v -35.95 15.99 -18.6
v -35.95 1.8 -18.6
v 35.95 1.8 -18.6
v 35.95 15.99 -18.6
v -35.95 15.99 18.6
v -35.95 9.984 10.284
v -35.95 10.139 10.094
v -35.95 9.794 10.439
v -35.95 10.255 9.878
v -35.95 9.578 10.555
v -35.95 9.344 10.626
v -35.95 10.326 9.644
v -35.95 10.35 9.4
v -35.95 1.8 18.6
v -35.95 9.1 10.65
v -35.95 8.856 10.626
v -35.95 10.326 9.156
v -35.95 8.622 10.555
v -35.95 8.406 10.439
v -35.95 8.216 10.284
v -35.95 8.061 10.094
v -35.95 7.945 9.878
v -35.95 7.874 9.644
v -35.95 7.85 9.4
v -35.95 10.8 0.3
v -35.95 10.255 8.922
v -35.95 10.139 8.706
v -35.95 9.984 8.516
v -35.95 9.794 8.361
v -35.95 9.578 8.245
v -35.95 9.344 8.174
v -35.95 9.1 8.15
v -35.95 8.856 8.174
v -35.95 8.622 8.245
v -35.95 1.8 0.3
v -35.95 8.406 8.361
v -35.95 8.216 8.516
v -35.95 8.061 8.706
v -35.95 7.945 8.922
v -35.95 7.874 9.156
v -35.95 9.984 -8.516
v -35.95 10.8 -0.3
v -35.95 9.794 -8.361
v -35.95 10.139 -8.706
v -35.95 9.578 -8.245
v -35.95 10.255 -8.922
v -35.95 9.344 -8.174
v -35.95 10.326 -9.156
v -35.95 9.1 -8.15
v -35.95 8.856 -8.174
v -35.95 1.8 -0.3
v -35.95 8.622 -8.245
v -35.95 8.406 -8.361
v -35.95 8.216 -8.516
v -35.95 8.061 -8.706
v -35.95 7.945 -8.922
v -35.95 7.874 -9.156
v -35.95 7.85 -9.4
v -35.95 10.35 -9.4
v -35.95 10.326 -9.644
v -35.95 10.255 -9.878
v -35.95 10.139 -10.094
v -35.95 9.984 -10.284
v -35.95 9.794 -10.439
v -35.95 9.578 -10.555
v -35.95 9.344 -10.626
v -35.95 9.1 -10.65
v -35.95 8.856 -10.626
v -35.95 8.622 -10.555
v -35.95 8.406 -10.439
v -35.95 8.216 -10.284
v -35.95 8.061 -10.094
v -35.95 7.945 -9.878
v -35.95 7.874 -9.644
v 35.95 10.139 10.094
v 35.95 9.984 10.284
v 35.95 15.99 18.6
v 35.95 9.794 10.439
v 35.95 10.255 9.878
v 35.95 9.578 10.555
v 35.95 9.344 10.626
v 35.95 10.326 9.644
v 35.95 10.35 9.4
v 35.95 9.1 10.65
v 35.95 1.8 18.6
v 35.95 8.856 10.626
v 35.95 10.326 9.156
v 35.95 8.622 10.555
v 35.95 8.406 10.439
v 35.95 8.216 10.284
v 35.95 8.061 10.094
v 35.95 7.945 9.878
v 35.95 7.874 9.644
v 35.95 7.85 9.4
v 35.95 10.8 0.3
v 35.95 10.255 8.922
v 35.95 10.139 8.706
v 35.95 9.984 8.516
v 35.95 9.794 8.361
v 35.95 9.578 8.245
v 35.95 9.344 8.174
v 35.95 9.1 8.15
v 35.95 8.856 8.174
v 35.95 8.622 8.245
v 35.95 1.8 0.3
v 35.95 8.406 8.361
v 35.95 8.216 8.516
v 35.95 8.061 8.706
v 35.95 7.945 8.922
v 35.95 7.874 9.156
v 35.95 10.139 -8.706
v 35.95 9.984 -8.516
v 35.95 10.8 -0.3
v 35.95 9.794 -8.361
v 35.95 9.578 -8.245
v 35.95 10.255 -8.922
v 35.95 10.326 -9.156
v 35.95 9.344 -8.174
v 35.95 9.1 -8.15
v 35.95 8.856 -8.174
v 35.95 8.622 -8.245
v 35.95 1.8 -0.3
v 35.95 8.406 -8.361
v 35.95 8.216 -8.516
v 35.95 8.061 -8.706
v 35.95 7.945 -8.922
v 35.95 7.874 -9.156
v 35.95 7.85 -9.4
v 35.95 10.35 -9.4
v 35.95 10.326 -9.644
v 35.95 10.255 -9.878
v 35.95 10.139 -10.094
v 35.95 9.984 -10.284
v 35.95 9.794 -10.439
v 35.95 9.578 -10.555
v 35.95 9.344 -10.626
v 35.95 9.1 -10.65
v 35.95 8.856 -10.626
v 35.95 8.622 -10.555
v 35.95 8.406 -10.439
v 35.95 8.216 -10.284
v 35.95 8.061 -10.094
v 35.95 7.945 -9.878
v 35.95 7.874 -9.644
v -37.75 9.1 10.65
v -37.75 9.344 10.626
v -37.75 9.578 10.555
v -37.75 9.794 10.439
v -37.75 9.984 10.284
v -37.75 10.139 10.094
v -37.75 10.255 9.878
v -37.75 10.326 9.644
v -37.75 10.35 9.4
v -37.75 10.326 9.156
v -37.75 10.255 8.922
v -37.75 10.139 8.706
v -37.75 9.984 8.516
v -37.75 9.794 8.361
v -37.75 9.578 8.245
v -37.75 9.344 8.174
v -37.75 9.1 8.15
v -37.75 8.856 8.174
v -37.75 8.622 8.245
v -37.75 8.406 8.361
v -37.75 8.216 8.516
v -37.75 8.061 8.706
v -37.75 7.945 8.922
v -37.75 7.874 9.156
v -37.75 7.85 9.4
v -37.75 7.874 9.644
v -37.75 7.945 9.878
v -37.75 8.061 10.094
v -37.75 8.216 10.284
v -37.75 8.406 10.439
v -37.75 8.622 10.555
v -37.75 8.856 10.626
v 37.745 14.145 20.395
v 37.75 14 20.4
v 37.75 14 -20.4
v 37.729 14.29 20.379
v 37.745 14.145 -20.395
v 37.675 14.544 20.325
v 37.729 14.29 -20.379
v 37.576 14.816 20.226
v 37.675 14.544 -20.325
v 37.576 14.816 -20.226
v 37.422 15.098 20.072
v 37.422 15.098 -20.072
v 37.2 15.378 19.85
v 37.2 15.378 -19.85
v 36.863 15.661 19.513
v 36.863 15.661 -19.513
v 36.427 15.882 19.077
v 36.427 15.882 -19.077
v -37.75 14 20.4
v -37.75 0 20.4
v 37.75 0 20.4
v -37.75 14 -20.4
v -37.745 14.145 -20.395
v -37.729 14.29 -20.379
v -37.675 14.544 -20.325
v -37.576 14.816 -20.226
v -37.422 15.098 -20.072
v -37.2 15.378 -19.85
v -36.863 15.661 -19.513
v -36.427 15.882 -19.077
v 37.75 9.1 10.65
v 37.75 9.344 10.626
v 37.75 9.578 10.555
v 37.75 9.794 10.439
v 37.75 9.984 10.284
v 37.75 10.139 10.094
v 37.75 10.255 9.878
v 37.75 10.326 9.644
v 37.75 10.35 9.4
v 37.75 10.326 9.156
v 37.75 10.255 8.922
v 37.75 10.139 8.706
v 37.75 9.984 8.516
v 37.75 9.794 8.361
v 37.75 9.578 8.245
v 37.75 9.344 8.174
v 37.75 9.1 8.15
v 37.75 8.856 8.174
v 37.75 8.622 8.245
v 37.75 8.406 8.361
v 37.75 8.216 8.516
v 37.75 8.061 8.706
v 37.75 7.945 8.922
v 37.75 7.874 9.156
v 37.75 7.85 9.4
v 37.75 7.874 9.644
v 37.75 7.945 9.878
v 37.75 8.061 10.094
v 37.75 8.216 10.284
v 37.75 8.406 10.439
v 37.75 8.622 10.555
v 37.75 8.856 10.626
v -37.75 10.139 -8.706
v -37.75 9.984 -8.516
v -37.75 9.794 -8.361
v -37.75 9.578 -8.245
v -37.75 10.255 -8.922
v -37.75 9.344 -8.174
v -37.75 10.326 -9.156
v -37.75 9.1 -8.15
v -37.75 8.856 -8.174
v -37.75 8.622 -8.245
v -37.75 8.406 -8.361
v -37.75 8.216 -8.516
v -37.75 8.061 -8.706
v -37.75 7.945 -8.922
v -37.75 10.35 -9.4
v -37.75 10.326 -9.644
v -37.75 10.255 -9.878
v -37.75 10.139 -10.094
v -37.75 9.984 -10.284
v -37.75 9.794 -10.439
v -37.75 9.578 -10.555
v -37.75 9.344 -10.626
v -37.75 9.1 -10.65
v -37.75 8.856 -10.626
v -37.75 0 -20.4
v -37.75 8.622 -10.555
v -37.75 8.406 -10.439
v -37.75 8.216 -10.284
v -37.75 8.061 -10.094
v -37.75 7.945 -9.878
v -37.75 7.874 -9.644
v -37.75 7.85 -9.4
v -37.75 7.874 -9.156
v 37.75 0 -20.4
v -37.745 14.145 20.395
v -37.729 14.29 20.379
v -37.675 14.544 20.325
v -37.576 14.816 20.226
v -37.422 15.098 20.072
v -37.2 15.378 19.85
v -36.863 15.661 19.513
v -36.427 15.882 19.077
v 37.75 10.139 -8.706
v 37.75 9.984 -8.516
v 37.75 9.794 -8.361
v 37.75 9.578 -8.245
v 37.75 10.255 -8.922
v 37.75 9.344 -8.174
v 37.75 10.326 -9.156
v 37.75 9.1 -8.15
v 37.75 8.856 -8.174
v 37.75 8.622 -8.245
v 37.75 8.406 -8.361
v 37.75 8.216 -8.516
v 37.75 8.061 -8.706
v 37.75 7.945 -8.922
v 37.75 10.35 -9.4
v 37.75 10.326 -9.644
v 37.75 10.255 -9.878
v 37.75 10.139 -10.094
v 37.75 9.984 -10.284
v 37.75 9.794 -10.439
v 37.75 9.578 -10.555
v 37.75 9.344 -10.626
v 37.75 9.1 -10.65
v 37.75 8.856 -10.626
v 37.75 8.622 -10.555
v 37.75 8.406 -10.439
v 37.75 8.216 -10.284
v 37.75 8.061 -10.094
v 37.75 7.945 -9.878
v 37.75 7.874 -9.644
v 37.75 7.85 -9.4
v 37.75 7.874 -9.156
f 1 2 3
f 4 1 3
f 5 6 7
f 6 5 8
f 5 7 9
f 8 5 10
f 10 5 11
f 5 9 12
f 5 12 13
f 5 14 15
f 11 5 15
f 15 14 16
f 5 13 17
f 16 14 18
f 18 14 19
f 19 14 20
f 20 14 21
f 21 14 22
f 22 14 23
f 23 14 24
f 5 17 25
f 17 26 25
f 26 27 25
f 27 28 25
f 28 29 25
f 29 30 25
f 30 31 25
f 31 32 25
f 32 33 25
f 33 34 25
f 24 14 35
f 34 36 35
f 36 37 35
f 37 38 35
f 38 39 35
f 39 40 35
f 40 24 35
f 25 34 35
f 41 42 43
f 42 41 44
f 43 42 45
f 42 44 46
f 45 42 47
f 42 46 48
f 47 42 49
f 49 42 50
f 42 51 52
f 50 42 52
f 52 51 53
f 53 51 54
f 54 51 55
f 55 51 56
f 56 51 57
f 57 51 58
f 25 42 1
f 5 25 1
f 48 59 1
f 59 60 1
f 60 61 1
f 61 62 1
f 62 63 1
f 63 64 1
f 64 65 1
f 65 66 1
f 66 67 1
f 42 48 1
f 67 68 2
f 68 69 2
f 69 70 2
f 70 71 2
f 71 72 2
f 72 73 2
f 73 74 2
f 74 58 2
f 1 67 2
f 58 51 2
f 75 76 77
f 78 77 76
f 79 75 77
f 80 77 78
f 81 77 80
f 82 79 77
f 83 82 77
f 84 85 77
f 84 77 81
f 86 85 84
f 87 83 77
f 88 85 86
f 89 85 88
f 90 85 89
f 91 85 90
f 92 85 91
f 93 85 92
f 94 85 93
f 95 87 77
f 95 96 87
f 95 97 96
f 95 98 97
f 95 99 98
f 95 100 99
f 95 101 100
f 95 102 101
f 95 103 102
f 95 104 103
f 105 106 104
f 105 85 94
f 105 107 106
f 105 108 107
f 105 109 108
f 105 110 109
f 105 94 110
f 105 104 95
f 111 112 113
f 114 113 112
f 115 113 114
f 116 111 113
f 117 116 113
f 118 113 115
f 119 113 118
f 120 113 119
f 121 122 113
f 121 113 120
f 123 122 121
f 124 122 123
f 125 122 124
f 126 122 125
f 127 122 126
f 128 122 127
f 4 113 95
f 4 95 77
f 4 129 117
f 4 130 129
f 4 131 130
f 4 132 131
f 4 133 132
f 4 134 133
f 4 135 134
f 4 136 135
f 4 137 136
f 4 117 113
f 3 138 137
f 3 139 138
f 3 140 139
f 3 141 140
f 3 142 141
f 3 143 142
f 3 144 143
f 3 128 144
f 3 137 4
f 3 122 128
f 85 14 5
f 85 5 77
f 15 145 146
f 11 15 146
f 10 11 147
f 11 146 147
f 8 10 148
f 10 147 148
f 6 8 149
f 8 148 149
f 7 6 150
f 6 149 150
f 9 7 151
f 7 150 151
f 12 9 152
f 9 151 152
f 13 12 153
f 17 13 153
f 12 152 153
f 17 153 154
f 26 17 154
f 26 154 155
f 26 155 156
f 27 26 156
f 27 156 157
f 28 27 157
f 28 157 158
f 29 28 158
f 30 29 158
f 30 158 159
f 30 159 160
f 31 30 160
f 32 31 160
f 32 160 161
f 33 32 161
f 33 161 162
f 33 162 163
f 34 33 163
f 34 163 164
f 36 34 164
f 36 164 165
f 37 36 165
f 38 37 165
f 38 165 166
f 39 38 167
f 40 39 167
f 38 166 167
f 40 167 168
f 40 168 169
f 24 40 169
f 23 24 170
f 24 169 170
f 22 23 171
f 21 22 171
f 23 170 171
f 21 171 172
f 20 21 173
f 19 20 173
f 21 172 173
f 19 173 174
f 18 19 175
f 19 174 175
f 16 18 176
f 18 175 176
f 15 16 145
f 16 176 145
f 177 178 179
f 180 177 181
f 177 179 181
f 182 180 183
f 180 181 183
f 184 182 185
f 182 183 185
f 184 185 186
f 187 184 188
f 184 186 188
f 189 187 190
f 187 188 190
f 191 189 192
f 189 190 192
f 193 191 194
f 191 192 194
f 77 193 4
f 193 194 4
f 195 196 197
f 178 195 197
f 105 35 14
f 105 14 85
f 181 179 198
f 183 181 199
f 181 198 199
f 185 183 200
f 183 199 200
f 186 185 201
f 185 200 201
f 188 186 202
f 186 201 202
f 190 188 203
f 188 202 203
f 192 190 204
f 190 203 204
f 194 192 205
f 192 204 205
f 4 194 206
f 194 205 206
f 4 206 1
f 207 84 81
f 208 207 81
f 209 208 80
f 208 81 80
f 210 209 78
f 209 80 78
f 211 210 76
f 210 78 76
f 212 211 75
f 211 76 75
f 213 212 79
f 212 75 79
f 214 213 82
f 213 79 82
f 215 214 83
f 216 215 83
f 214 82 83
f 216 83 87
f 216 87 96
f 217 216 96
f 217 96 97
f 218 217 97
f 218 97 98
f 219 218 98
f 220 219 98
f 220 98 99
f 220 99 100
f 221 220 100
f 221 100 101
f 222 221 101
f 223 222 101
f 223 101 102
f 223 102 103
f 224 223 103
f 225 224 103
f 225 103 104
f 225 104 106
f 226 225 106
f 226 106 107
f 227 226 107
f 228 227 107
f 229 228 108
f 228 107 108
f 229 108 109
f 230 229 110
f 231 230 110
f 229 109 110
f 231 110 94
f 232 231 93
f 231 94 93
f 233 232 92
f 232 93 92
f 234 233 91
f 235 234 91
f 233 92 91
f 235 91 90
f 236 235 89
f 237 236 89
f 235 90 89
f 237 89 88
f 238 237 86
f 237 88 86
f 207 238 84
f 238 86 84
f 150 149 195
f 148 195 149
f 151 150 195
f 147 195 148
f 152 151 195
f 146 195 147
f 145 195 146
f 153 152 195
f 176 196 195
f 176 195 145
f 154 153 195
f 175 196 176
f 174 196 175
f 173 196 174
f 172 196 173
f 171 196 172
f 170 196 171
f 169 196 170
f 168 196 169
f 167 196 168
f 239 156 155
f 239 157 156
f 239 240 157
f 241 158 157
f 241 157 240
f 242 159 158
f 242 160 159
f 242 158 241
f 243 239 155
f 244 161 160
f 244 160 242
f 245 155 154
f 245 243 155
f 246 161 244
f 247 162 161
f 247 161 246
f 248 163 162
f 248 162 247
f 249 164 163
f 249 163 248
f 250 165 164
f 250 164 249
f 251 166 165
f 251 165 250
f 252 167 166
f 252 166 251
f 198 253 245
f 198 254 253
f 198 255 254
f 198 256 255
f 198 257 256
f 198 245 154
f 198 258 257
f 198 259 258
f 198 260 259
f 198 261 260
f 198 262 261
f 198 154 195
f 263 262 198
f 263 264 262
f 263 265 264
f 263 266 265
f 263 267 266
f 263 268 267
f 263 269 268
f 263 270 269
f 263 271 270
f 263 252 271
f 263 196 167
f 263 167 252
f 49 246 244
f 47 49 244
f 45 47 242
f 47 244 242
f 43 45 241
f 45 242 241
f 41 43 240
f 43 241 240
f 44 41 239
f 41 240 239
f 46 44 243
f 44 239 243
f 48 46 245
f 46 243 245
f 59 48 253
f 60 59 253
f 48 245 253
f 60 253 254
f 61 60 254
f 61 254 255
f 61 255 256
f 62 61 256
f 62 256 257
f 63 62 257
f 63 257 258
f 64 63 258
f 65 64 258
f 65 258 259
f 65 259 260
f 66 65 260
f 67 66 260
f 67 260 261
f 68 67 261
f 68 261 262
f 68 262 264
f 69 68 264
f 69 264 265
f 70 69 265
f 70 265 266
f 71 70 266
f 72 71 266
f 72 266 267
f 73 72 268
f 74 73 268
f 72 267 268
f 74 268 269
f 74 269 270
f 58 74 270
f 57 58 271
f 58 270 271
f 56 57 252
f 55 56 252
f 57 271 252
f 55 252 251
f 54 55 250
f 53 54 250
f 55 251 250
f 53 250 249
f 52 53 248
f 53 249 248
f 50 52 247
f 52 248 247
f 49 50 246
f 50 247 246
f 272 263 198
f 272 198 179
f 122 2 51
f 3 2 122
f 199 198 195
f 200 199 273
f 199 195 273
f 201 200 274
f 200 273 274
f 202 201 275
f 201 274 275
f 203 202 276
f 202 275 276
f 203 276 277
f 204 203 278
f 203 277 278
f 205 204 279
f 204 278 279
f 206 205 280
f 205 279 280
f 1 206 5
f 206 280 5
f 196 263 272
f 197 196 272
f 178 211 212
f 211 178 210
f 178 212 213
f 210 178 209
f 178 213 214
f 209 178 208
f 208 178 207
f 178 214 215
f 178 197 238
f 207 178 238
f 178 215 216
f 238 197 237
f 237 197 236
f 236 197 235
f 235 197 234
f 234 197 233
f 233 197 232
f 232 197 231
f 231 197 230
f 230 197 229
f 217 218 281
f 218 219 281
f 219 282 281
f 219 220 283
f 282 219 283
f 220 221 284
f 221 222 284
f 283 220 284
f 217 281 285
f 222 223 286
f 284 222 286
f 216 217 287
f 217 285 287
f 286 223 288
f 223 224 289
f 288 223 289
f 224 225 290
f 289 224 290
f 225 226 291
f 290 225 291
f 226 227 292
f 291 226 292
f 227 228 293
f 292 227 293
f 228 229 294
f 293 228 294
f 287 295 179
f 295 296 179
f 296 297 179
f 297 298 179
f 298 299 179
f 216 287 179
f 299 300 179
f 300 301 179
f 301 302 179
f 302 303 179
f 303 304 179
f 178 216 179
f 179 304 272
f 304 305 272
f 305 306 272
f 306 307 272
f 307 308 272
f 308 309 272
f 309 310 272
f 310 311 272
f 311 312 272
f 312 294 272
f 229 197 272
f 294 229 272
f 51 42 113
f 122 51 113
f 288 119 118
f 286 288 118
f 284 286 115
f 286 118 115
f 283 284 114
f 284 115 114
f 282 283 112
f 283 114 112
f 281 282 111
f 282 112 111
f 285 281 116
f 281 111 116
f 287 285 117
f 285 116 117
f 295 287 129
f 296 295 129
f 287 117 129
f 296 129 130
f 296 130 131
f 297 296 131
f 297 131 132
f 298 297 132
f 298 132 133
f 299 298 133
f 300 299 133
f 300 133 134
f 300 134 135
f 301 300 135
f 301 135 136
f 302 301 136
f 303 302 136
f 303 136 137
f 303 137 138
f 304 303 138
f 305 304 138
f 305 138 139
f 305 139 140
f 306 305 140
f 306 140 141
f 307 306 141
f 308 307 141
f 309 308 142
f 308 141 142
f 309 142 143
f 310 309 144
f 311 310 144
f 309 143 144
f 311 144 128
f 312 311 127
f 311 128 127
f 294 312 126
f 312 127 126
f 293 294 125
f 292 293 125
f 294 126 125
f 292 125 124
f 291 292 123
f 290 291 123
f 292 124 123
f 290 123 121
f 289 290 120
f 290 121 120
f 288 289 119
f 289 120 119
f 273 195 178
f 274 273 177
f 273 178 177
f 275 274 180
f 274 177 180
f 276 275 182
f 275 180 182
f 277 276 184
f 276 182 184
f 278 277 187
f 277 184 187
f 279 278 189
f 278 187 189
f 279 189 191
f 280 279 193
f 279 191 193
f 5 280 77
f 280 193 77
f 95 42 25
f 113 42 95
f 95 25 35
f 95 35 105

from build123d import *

# Parameters (mm, degrees)
CROQUIS1_W                   = 75.5
CROQUIS1_H                   = 40.8
SALIENTE_EXTRUIR1_DEPTH      = 16
VACIADO1_T                   = -1.8
SALIENTE_EXTRUIR2_DEPTH      = 0.3
SALIENTE_EXTRUIR2_DEPTH_BACK = 0.3
CROQUIS2_W                   = 71.9
CROQUIS2_H                   = 9
CORTAR_EXTRUIR1_REACH        = 81.827
CROQUIS3_R                   = 1.25
MATRIZL1_COUNT               = 2
MATRIZL1_PITCH               = 18.8
REDONDEO1_R                  = 2


with BuildPart() as part:
    # Croquis1 → Saliente-Extruir1 (new body)
    with BuildSketch(Plane(origin=(0, 0, 0), x_dir=(1, 0, 0), z_dir=(0, 1, 0))):
        Rectangle(CROQUIS1_W, CROQUIS1_H)
    extrude(amount=SALIENTE_EXTRUIR1_DEPTH)

    # Vaciado1
    vaciado1_openings = [part.faces().sort_by_distance(p)[0] for p in [
        (0, 16, 0),
    ]]
    offset(amount=VACIADO1_T, openings=vaciado1_openings, kind=Kind.INTERSECTION)

    # Croquis2 → Saliente-Extruir2 (add, two sides: drawn at the far end of the back side and taken through both)
    with BuildSketch(Plane.XY.offset(-SALIENTE_EXTRUIR2_DEPTH_BACK)):
        with Locations((0, 6.3)):
            Rectangle(CROQUIS2_W, CROQUIS2_H)
    extrude(amount=SALIENTE_EXTRUIR2_DEPTH + SALIENTE_EXTRUIR2_DEPTH_BACK)

    # Cortar-Extruir1: up to this face of the body (flat: up to its plane)
    cortar_extruir1_end = Plane(part.part.faces().sort_by_distance((37.75, 8, 0))[0])
    # Croquis3 → Cortar-Extruir1 (cut, up to the picked face)
    with BuildSketch(Plane.ZY.offset(37.75), mode=Mode.PRIVATE) as cortar_extruir1_sk1:
        with Locations((9.4, 9.1)):
            Circle(CROQUIS3_R)
    cortar_extruir1_tool1 = split(extrude(cortar_extruir1_sk1.sketch, amount=-CORTAR_EXTRUIR1_REACH, mode=Mode.PRIVATE), bisect_by=cortar_extruir1_end, keep=Keep.BOTH, mode=Mode.PRIVATE)
    cortar_extruir1 = cortar_extruir1_tool1.solids().sort_by(Axis((-37.75, 9.1, 9.4), (1, 0, 0)))[0]
    add(cortar_extruir1, mode=Mode.SUBTRACT)

    # MatrizL1: Cortar-Extruir1 ×2
    with Locations(*[(0, 0, -i * MATRIZL1_PITCH) for i in range(1, MATRIZL1_COUNT)]):
        add(cortar_extruir1, mode=Mode.SUBTRACT)

    # Redondeo1
    # the kernel refuses this fillet: 2 mm, written as the material it takes off along each edge
    with BuildSketch(Plane(origin=(-42.75, 16, -20.4), x_dir=(0, -1, 0), z_dir=(1, 0, 0))) as redondeo1_piece_1:
        with BuildLine():
            CenterArc((REDONDEO1_R, -REDONDEO1_R), REDONDEO1_R, 90, 90)
            Line((0, -REDONDEO1_R), (0, 0))
            Line((0, 0), (REDONDEO1_R, 0))
        make_face()
    extrude(amount=85.5, mode=Mode.SUBTRACT)
    with BuildSketch(Plane(origin=(-37.75, 16, 25.4), x_dir=(0, -1, 0), z_dir=(0, 0, -1)), Plane(origin=(37.75, 16, -25.4), x_dir=(0, -1, 0), z_dir=(0, 0, 1))) as redondeo1_piece_2:
        with BuildLine():
            CenterArc((REDONDEO1_R, -REDONDEO1_R), REDONDEO1_R, 90, 90)
            Line((0, -REDONDEO1_R), (0, 0))
            Line((0, 0), (REDONDEO1_R, 0))
        make_face()
    extrude(amount=50.8, mode=Mode.SUBTRACT)
    with BuildSketch(Plane(origin=(42.75, 16, 20.4), x_dir=(0, 0, -1), z_dir=(-1, 0, 0))) as redondeo1_piece_3:
        with BuildLine():
            CenterArc((REDONDEO1_R, REDONDEO1_R), REDONDEO1_R, 180, 90)
            Line((0, REDONDEO1_R), (0, 0))
            Line((0, 0), (REDONDEO1_R, 0))
        make_face()
    extrude(amount=85.5, mode=Mode.SUBTRACT)


solid = part.part
